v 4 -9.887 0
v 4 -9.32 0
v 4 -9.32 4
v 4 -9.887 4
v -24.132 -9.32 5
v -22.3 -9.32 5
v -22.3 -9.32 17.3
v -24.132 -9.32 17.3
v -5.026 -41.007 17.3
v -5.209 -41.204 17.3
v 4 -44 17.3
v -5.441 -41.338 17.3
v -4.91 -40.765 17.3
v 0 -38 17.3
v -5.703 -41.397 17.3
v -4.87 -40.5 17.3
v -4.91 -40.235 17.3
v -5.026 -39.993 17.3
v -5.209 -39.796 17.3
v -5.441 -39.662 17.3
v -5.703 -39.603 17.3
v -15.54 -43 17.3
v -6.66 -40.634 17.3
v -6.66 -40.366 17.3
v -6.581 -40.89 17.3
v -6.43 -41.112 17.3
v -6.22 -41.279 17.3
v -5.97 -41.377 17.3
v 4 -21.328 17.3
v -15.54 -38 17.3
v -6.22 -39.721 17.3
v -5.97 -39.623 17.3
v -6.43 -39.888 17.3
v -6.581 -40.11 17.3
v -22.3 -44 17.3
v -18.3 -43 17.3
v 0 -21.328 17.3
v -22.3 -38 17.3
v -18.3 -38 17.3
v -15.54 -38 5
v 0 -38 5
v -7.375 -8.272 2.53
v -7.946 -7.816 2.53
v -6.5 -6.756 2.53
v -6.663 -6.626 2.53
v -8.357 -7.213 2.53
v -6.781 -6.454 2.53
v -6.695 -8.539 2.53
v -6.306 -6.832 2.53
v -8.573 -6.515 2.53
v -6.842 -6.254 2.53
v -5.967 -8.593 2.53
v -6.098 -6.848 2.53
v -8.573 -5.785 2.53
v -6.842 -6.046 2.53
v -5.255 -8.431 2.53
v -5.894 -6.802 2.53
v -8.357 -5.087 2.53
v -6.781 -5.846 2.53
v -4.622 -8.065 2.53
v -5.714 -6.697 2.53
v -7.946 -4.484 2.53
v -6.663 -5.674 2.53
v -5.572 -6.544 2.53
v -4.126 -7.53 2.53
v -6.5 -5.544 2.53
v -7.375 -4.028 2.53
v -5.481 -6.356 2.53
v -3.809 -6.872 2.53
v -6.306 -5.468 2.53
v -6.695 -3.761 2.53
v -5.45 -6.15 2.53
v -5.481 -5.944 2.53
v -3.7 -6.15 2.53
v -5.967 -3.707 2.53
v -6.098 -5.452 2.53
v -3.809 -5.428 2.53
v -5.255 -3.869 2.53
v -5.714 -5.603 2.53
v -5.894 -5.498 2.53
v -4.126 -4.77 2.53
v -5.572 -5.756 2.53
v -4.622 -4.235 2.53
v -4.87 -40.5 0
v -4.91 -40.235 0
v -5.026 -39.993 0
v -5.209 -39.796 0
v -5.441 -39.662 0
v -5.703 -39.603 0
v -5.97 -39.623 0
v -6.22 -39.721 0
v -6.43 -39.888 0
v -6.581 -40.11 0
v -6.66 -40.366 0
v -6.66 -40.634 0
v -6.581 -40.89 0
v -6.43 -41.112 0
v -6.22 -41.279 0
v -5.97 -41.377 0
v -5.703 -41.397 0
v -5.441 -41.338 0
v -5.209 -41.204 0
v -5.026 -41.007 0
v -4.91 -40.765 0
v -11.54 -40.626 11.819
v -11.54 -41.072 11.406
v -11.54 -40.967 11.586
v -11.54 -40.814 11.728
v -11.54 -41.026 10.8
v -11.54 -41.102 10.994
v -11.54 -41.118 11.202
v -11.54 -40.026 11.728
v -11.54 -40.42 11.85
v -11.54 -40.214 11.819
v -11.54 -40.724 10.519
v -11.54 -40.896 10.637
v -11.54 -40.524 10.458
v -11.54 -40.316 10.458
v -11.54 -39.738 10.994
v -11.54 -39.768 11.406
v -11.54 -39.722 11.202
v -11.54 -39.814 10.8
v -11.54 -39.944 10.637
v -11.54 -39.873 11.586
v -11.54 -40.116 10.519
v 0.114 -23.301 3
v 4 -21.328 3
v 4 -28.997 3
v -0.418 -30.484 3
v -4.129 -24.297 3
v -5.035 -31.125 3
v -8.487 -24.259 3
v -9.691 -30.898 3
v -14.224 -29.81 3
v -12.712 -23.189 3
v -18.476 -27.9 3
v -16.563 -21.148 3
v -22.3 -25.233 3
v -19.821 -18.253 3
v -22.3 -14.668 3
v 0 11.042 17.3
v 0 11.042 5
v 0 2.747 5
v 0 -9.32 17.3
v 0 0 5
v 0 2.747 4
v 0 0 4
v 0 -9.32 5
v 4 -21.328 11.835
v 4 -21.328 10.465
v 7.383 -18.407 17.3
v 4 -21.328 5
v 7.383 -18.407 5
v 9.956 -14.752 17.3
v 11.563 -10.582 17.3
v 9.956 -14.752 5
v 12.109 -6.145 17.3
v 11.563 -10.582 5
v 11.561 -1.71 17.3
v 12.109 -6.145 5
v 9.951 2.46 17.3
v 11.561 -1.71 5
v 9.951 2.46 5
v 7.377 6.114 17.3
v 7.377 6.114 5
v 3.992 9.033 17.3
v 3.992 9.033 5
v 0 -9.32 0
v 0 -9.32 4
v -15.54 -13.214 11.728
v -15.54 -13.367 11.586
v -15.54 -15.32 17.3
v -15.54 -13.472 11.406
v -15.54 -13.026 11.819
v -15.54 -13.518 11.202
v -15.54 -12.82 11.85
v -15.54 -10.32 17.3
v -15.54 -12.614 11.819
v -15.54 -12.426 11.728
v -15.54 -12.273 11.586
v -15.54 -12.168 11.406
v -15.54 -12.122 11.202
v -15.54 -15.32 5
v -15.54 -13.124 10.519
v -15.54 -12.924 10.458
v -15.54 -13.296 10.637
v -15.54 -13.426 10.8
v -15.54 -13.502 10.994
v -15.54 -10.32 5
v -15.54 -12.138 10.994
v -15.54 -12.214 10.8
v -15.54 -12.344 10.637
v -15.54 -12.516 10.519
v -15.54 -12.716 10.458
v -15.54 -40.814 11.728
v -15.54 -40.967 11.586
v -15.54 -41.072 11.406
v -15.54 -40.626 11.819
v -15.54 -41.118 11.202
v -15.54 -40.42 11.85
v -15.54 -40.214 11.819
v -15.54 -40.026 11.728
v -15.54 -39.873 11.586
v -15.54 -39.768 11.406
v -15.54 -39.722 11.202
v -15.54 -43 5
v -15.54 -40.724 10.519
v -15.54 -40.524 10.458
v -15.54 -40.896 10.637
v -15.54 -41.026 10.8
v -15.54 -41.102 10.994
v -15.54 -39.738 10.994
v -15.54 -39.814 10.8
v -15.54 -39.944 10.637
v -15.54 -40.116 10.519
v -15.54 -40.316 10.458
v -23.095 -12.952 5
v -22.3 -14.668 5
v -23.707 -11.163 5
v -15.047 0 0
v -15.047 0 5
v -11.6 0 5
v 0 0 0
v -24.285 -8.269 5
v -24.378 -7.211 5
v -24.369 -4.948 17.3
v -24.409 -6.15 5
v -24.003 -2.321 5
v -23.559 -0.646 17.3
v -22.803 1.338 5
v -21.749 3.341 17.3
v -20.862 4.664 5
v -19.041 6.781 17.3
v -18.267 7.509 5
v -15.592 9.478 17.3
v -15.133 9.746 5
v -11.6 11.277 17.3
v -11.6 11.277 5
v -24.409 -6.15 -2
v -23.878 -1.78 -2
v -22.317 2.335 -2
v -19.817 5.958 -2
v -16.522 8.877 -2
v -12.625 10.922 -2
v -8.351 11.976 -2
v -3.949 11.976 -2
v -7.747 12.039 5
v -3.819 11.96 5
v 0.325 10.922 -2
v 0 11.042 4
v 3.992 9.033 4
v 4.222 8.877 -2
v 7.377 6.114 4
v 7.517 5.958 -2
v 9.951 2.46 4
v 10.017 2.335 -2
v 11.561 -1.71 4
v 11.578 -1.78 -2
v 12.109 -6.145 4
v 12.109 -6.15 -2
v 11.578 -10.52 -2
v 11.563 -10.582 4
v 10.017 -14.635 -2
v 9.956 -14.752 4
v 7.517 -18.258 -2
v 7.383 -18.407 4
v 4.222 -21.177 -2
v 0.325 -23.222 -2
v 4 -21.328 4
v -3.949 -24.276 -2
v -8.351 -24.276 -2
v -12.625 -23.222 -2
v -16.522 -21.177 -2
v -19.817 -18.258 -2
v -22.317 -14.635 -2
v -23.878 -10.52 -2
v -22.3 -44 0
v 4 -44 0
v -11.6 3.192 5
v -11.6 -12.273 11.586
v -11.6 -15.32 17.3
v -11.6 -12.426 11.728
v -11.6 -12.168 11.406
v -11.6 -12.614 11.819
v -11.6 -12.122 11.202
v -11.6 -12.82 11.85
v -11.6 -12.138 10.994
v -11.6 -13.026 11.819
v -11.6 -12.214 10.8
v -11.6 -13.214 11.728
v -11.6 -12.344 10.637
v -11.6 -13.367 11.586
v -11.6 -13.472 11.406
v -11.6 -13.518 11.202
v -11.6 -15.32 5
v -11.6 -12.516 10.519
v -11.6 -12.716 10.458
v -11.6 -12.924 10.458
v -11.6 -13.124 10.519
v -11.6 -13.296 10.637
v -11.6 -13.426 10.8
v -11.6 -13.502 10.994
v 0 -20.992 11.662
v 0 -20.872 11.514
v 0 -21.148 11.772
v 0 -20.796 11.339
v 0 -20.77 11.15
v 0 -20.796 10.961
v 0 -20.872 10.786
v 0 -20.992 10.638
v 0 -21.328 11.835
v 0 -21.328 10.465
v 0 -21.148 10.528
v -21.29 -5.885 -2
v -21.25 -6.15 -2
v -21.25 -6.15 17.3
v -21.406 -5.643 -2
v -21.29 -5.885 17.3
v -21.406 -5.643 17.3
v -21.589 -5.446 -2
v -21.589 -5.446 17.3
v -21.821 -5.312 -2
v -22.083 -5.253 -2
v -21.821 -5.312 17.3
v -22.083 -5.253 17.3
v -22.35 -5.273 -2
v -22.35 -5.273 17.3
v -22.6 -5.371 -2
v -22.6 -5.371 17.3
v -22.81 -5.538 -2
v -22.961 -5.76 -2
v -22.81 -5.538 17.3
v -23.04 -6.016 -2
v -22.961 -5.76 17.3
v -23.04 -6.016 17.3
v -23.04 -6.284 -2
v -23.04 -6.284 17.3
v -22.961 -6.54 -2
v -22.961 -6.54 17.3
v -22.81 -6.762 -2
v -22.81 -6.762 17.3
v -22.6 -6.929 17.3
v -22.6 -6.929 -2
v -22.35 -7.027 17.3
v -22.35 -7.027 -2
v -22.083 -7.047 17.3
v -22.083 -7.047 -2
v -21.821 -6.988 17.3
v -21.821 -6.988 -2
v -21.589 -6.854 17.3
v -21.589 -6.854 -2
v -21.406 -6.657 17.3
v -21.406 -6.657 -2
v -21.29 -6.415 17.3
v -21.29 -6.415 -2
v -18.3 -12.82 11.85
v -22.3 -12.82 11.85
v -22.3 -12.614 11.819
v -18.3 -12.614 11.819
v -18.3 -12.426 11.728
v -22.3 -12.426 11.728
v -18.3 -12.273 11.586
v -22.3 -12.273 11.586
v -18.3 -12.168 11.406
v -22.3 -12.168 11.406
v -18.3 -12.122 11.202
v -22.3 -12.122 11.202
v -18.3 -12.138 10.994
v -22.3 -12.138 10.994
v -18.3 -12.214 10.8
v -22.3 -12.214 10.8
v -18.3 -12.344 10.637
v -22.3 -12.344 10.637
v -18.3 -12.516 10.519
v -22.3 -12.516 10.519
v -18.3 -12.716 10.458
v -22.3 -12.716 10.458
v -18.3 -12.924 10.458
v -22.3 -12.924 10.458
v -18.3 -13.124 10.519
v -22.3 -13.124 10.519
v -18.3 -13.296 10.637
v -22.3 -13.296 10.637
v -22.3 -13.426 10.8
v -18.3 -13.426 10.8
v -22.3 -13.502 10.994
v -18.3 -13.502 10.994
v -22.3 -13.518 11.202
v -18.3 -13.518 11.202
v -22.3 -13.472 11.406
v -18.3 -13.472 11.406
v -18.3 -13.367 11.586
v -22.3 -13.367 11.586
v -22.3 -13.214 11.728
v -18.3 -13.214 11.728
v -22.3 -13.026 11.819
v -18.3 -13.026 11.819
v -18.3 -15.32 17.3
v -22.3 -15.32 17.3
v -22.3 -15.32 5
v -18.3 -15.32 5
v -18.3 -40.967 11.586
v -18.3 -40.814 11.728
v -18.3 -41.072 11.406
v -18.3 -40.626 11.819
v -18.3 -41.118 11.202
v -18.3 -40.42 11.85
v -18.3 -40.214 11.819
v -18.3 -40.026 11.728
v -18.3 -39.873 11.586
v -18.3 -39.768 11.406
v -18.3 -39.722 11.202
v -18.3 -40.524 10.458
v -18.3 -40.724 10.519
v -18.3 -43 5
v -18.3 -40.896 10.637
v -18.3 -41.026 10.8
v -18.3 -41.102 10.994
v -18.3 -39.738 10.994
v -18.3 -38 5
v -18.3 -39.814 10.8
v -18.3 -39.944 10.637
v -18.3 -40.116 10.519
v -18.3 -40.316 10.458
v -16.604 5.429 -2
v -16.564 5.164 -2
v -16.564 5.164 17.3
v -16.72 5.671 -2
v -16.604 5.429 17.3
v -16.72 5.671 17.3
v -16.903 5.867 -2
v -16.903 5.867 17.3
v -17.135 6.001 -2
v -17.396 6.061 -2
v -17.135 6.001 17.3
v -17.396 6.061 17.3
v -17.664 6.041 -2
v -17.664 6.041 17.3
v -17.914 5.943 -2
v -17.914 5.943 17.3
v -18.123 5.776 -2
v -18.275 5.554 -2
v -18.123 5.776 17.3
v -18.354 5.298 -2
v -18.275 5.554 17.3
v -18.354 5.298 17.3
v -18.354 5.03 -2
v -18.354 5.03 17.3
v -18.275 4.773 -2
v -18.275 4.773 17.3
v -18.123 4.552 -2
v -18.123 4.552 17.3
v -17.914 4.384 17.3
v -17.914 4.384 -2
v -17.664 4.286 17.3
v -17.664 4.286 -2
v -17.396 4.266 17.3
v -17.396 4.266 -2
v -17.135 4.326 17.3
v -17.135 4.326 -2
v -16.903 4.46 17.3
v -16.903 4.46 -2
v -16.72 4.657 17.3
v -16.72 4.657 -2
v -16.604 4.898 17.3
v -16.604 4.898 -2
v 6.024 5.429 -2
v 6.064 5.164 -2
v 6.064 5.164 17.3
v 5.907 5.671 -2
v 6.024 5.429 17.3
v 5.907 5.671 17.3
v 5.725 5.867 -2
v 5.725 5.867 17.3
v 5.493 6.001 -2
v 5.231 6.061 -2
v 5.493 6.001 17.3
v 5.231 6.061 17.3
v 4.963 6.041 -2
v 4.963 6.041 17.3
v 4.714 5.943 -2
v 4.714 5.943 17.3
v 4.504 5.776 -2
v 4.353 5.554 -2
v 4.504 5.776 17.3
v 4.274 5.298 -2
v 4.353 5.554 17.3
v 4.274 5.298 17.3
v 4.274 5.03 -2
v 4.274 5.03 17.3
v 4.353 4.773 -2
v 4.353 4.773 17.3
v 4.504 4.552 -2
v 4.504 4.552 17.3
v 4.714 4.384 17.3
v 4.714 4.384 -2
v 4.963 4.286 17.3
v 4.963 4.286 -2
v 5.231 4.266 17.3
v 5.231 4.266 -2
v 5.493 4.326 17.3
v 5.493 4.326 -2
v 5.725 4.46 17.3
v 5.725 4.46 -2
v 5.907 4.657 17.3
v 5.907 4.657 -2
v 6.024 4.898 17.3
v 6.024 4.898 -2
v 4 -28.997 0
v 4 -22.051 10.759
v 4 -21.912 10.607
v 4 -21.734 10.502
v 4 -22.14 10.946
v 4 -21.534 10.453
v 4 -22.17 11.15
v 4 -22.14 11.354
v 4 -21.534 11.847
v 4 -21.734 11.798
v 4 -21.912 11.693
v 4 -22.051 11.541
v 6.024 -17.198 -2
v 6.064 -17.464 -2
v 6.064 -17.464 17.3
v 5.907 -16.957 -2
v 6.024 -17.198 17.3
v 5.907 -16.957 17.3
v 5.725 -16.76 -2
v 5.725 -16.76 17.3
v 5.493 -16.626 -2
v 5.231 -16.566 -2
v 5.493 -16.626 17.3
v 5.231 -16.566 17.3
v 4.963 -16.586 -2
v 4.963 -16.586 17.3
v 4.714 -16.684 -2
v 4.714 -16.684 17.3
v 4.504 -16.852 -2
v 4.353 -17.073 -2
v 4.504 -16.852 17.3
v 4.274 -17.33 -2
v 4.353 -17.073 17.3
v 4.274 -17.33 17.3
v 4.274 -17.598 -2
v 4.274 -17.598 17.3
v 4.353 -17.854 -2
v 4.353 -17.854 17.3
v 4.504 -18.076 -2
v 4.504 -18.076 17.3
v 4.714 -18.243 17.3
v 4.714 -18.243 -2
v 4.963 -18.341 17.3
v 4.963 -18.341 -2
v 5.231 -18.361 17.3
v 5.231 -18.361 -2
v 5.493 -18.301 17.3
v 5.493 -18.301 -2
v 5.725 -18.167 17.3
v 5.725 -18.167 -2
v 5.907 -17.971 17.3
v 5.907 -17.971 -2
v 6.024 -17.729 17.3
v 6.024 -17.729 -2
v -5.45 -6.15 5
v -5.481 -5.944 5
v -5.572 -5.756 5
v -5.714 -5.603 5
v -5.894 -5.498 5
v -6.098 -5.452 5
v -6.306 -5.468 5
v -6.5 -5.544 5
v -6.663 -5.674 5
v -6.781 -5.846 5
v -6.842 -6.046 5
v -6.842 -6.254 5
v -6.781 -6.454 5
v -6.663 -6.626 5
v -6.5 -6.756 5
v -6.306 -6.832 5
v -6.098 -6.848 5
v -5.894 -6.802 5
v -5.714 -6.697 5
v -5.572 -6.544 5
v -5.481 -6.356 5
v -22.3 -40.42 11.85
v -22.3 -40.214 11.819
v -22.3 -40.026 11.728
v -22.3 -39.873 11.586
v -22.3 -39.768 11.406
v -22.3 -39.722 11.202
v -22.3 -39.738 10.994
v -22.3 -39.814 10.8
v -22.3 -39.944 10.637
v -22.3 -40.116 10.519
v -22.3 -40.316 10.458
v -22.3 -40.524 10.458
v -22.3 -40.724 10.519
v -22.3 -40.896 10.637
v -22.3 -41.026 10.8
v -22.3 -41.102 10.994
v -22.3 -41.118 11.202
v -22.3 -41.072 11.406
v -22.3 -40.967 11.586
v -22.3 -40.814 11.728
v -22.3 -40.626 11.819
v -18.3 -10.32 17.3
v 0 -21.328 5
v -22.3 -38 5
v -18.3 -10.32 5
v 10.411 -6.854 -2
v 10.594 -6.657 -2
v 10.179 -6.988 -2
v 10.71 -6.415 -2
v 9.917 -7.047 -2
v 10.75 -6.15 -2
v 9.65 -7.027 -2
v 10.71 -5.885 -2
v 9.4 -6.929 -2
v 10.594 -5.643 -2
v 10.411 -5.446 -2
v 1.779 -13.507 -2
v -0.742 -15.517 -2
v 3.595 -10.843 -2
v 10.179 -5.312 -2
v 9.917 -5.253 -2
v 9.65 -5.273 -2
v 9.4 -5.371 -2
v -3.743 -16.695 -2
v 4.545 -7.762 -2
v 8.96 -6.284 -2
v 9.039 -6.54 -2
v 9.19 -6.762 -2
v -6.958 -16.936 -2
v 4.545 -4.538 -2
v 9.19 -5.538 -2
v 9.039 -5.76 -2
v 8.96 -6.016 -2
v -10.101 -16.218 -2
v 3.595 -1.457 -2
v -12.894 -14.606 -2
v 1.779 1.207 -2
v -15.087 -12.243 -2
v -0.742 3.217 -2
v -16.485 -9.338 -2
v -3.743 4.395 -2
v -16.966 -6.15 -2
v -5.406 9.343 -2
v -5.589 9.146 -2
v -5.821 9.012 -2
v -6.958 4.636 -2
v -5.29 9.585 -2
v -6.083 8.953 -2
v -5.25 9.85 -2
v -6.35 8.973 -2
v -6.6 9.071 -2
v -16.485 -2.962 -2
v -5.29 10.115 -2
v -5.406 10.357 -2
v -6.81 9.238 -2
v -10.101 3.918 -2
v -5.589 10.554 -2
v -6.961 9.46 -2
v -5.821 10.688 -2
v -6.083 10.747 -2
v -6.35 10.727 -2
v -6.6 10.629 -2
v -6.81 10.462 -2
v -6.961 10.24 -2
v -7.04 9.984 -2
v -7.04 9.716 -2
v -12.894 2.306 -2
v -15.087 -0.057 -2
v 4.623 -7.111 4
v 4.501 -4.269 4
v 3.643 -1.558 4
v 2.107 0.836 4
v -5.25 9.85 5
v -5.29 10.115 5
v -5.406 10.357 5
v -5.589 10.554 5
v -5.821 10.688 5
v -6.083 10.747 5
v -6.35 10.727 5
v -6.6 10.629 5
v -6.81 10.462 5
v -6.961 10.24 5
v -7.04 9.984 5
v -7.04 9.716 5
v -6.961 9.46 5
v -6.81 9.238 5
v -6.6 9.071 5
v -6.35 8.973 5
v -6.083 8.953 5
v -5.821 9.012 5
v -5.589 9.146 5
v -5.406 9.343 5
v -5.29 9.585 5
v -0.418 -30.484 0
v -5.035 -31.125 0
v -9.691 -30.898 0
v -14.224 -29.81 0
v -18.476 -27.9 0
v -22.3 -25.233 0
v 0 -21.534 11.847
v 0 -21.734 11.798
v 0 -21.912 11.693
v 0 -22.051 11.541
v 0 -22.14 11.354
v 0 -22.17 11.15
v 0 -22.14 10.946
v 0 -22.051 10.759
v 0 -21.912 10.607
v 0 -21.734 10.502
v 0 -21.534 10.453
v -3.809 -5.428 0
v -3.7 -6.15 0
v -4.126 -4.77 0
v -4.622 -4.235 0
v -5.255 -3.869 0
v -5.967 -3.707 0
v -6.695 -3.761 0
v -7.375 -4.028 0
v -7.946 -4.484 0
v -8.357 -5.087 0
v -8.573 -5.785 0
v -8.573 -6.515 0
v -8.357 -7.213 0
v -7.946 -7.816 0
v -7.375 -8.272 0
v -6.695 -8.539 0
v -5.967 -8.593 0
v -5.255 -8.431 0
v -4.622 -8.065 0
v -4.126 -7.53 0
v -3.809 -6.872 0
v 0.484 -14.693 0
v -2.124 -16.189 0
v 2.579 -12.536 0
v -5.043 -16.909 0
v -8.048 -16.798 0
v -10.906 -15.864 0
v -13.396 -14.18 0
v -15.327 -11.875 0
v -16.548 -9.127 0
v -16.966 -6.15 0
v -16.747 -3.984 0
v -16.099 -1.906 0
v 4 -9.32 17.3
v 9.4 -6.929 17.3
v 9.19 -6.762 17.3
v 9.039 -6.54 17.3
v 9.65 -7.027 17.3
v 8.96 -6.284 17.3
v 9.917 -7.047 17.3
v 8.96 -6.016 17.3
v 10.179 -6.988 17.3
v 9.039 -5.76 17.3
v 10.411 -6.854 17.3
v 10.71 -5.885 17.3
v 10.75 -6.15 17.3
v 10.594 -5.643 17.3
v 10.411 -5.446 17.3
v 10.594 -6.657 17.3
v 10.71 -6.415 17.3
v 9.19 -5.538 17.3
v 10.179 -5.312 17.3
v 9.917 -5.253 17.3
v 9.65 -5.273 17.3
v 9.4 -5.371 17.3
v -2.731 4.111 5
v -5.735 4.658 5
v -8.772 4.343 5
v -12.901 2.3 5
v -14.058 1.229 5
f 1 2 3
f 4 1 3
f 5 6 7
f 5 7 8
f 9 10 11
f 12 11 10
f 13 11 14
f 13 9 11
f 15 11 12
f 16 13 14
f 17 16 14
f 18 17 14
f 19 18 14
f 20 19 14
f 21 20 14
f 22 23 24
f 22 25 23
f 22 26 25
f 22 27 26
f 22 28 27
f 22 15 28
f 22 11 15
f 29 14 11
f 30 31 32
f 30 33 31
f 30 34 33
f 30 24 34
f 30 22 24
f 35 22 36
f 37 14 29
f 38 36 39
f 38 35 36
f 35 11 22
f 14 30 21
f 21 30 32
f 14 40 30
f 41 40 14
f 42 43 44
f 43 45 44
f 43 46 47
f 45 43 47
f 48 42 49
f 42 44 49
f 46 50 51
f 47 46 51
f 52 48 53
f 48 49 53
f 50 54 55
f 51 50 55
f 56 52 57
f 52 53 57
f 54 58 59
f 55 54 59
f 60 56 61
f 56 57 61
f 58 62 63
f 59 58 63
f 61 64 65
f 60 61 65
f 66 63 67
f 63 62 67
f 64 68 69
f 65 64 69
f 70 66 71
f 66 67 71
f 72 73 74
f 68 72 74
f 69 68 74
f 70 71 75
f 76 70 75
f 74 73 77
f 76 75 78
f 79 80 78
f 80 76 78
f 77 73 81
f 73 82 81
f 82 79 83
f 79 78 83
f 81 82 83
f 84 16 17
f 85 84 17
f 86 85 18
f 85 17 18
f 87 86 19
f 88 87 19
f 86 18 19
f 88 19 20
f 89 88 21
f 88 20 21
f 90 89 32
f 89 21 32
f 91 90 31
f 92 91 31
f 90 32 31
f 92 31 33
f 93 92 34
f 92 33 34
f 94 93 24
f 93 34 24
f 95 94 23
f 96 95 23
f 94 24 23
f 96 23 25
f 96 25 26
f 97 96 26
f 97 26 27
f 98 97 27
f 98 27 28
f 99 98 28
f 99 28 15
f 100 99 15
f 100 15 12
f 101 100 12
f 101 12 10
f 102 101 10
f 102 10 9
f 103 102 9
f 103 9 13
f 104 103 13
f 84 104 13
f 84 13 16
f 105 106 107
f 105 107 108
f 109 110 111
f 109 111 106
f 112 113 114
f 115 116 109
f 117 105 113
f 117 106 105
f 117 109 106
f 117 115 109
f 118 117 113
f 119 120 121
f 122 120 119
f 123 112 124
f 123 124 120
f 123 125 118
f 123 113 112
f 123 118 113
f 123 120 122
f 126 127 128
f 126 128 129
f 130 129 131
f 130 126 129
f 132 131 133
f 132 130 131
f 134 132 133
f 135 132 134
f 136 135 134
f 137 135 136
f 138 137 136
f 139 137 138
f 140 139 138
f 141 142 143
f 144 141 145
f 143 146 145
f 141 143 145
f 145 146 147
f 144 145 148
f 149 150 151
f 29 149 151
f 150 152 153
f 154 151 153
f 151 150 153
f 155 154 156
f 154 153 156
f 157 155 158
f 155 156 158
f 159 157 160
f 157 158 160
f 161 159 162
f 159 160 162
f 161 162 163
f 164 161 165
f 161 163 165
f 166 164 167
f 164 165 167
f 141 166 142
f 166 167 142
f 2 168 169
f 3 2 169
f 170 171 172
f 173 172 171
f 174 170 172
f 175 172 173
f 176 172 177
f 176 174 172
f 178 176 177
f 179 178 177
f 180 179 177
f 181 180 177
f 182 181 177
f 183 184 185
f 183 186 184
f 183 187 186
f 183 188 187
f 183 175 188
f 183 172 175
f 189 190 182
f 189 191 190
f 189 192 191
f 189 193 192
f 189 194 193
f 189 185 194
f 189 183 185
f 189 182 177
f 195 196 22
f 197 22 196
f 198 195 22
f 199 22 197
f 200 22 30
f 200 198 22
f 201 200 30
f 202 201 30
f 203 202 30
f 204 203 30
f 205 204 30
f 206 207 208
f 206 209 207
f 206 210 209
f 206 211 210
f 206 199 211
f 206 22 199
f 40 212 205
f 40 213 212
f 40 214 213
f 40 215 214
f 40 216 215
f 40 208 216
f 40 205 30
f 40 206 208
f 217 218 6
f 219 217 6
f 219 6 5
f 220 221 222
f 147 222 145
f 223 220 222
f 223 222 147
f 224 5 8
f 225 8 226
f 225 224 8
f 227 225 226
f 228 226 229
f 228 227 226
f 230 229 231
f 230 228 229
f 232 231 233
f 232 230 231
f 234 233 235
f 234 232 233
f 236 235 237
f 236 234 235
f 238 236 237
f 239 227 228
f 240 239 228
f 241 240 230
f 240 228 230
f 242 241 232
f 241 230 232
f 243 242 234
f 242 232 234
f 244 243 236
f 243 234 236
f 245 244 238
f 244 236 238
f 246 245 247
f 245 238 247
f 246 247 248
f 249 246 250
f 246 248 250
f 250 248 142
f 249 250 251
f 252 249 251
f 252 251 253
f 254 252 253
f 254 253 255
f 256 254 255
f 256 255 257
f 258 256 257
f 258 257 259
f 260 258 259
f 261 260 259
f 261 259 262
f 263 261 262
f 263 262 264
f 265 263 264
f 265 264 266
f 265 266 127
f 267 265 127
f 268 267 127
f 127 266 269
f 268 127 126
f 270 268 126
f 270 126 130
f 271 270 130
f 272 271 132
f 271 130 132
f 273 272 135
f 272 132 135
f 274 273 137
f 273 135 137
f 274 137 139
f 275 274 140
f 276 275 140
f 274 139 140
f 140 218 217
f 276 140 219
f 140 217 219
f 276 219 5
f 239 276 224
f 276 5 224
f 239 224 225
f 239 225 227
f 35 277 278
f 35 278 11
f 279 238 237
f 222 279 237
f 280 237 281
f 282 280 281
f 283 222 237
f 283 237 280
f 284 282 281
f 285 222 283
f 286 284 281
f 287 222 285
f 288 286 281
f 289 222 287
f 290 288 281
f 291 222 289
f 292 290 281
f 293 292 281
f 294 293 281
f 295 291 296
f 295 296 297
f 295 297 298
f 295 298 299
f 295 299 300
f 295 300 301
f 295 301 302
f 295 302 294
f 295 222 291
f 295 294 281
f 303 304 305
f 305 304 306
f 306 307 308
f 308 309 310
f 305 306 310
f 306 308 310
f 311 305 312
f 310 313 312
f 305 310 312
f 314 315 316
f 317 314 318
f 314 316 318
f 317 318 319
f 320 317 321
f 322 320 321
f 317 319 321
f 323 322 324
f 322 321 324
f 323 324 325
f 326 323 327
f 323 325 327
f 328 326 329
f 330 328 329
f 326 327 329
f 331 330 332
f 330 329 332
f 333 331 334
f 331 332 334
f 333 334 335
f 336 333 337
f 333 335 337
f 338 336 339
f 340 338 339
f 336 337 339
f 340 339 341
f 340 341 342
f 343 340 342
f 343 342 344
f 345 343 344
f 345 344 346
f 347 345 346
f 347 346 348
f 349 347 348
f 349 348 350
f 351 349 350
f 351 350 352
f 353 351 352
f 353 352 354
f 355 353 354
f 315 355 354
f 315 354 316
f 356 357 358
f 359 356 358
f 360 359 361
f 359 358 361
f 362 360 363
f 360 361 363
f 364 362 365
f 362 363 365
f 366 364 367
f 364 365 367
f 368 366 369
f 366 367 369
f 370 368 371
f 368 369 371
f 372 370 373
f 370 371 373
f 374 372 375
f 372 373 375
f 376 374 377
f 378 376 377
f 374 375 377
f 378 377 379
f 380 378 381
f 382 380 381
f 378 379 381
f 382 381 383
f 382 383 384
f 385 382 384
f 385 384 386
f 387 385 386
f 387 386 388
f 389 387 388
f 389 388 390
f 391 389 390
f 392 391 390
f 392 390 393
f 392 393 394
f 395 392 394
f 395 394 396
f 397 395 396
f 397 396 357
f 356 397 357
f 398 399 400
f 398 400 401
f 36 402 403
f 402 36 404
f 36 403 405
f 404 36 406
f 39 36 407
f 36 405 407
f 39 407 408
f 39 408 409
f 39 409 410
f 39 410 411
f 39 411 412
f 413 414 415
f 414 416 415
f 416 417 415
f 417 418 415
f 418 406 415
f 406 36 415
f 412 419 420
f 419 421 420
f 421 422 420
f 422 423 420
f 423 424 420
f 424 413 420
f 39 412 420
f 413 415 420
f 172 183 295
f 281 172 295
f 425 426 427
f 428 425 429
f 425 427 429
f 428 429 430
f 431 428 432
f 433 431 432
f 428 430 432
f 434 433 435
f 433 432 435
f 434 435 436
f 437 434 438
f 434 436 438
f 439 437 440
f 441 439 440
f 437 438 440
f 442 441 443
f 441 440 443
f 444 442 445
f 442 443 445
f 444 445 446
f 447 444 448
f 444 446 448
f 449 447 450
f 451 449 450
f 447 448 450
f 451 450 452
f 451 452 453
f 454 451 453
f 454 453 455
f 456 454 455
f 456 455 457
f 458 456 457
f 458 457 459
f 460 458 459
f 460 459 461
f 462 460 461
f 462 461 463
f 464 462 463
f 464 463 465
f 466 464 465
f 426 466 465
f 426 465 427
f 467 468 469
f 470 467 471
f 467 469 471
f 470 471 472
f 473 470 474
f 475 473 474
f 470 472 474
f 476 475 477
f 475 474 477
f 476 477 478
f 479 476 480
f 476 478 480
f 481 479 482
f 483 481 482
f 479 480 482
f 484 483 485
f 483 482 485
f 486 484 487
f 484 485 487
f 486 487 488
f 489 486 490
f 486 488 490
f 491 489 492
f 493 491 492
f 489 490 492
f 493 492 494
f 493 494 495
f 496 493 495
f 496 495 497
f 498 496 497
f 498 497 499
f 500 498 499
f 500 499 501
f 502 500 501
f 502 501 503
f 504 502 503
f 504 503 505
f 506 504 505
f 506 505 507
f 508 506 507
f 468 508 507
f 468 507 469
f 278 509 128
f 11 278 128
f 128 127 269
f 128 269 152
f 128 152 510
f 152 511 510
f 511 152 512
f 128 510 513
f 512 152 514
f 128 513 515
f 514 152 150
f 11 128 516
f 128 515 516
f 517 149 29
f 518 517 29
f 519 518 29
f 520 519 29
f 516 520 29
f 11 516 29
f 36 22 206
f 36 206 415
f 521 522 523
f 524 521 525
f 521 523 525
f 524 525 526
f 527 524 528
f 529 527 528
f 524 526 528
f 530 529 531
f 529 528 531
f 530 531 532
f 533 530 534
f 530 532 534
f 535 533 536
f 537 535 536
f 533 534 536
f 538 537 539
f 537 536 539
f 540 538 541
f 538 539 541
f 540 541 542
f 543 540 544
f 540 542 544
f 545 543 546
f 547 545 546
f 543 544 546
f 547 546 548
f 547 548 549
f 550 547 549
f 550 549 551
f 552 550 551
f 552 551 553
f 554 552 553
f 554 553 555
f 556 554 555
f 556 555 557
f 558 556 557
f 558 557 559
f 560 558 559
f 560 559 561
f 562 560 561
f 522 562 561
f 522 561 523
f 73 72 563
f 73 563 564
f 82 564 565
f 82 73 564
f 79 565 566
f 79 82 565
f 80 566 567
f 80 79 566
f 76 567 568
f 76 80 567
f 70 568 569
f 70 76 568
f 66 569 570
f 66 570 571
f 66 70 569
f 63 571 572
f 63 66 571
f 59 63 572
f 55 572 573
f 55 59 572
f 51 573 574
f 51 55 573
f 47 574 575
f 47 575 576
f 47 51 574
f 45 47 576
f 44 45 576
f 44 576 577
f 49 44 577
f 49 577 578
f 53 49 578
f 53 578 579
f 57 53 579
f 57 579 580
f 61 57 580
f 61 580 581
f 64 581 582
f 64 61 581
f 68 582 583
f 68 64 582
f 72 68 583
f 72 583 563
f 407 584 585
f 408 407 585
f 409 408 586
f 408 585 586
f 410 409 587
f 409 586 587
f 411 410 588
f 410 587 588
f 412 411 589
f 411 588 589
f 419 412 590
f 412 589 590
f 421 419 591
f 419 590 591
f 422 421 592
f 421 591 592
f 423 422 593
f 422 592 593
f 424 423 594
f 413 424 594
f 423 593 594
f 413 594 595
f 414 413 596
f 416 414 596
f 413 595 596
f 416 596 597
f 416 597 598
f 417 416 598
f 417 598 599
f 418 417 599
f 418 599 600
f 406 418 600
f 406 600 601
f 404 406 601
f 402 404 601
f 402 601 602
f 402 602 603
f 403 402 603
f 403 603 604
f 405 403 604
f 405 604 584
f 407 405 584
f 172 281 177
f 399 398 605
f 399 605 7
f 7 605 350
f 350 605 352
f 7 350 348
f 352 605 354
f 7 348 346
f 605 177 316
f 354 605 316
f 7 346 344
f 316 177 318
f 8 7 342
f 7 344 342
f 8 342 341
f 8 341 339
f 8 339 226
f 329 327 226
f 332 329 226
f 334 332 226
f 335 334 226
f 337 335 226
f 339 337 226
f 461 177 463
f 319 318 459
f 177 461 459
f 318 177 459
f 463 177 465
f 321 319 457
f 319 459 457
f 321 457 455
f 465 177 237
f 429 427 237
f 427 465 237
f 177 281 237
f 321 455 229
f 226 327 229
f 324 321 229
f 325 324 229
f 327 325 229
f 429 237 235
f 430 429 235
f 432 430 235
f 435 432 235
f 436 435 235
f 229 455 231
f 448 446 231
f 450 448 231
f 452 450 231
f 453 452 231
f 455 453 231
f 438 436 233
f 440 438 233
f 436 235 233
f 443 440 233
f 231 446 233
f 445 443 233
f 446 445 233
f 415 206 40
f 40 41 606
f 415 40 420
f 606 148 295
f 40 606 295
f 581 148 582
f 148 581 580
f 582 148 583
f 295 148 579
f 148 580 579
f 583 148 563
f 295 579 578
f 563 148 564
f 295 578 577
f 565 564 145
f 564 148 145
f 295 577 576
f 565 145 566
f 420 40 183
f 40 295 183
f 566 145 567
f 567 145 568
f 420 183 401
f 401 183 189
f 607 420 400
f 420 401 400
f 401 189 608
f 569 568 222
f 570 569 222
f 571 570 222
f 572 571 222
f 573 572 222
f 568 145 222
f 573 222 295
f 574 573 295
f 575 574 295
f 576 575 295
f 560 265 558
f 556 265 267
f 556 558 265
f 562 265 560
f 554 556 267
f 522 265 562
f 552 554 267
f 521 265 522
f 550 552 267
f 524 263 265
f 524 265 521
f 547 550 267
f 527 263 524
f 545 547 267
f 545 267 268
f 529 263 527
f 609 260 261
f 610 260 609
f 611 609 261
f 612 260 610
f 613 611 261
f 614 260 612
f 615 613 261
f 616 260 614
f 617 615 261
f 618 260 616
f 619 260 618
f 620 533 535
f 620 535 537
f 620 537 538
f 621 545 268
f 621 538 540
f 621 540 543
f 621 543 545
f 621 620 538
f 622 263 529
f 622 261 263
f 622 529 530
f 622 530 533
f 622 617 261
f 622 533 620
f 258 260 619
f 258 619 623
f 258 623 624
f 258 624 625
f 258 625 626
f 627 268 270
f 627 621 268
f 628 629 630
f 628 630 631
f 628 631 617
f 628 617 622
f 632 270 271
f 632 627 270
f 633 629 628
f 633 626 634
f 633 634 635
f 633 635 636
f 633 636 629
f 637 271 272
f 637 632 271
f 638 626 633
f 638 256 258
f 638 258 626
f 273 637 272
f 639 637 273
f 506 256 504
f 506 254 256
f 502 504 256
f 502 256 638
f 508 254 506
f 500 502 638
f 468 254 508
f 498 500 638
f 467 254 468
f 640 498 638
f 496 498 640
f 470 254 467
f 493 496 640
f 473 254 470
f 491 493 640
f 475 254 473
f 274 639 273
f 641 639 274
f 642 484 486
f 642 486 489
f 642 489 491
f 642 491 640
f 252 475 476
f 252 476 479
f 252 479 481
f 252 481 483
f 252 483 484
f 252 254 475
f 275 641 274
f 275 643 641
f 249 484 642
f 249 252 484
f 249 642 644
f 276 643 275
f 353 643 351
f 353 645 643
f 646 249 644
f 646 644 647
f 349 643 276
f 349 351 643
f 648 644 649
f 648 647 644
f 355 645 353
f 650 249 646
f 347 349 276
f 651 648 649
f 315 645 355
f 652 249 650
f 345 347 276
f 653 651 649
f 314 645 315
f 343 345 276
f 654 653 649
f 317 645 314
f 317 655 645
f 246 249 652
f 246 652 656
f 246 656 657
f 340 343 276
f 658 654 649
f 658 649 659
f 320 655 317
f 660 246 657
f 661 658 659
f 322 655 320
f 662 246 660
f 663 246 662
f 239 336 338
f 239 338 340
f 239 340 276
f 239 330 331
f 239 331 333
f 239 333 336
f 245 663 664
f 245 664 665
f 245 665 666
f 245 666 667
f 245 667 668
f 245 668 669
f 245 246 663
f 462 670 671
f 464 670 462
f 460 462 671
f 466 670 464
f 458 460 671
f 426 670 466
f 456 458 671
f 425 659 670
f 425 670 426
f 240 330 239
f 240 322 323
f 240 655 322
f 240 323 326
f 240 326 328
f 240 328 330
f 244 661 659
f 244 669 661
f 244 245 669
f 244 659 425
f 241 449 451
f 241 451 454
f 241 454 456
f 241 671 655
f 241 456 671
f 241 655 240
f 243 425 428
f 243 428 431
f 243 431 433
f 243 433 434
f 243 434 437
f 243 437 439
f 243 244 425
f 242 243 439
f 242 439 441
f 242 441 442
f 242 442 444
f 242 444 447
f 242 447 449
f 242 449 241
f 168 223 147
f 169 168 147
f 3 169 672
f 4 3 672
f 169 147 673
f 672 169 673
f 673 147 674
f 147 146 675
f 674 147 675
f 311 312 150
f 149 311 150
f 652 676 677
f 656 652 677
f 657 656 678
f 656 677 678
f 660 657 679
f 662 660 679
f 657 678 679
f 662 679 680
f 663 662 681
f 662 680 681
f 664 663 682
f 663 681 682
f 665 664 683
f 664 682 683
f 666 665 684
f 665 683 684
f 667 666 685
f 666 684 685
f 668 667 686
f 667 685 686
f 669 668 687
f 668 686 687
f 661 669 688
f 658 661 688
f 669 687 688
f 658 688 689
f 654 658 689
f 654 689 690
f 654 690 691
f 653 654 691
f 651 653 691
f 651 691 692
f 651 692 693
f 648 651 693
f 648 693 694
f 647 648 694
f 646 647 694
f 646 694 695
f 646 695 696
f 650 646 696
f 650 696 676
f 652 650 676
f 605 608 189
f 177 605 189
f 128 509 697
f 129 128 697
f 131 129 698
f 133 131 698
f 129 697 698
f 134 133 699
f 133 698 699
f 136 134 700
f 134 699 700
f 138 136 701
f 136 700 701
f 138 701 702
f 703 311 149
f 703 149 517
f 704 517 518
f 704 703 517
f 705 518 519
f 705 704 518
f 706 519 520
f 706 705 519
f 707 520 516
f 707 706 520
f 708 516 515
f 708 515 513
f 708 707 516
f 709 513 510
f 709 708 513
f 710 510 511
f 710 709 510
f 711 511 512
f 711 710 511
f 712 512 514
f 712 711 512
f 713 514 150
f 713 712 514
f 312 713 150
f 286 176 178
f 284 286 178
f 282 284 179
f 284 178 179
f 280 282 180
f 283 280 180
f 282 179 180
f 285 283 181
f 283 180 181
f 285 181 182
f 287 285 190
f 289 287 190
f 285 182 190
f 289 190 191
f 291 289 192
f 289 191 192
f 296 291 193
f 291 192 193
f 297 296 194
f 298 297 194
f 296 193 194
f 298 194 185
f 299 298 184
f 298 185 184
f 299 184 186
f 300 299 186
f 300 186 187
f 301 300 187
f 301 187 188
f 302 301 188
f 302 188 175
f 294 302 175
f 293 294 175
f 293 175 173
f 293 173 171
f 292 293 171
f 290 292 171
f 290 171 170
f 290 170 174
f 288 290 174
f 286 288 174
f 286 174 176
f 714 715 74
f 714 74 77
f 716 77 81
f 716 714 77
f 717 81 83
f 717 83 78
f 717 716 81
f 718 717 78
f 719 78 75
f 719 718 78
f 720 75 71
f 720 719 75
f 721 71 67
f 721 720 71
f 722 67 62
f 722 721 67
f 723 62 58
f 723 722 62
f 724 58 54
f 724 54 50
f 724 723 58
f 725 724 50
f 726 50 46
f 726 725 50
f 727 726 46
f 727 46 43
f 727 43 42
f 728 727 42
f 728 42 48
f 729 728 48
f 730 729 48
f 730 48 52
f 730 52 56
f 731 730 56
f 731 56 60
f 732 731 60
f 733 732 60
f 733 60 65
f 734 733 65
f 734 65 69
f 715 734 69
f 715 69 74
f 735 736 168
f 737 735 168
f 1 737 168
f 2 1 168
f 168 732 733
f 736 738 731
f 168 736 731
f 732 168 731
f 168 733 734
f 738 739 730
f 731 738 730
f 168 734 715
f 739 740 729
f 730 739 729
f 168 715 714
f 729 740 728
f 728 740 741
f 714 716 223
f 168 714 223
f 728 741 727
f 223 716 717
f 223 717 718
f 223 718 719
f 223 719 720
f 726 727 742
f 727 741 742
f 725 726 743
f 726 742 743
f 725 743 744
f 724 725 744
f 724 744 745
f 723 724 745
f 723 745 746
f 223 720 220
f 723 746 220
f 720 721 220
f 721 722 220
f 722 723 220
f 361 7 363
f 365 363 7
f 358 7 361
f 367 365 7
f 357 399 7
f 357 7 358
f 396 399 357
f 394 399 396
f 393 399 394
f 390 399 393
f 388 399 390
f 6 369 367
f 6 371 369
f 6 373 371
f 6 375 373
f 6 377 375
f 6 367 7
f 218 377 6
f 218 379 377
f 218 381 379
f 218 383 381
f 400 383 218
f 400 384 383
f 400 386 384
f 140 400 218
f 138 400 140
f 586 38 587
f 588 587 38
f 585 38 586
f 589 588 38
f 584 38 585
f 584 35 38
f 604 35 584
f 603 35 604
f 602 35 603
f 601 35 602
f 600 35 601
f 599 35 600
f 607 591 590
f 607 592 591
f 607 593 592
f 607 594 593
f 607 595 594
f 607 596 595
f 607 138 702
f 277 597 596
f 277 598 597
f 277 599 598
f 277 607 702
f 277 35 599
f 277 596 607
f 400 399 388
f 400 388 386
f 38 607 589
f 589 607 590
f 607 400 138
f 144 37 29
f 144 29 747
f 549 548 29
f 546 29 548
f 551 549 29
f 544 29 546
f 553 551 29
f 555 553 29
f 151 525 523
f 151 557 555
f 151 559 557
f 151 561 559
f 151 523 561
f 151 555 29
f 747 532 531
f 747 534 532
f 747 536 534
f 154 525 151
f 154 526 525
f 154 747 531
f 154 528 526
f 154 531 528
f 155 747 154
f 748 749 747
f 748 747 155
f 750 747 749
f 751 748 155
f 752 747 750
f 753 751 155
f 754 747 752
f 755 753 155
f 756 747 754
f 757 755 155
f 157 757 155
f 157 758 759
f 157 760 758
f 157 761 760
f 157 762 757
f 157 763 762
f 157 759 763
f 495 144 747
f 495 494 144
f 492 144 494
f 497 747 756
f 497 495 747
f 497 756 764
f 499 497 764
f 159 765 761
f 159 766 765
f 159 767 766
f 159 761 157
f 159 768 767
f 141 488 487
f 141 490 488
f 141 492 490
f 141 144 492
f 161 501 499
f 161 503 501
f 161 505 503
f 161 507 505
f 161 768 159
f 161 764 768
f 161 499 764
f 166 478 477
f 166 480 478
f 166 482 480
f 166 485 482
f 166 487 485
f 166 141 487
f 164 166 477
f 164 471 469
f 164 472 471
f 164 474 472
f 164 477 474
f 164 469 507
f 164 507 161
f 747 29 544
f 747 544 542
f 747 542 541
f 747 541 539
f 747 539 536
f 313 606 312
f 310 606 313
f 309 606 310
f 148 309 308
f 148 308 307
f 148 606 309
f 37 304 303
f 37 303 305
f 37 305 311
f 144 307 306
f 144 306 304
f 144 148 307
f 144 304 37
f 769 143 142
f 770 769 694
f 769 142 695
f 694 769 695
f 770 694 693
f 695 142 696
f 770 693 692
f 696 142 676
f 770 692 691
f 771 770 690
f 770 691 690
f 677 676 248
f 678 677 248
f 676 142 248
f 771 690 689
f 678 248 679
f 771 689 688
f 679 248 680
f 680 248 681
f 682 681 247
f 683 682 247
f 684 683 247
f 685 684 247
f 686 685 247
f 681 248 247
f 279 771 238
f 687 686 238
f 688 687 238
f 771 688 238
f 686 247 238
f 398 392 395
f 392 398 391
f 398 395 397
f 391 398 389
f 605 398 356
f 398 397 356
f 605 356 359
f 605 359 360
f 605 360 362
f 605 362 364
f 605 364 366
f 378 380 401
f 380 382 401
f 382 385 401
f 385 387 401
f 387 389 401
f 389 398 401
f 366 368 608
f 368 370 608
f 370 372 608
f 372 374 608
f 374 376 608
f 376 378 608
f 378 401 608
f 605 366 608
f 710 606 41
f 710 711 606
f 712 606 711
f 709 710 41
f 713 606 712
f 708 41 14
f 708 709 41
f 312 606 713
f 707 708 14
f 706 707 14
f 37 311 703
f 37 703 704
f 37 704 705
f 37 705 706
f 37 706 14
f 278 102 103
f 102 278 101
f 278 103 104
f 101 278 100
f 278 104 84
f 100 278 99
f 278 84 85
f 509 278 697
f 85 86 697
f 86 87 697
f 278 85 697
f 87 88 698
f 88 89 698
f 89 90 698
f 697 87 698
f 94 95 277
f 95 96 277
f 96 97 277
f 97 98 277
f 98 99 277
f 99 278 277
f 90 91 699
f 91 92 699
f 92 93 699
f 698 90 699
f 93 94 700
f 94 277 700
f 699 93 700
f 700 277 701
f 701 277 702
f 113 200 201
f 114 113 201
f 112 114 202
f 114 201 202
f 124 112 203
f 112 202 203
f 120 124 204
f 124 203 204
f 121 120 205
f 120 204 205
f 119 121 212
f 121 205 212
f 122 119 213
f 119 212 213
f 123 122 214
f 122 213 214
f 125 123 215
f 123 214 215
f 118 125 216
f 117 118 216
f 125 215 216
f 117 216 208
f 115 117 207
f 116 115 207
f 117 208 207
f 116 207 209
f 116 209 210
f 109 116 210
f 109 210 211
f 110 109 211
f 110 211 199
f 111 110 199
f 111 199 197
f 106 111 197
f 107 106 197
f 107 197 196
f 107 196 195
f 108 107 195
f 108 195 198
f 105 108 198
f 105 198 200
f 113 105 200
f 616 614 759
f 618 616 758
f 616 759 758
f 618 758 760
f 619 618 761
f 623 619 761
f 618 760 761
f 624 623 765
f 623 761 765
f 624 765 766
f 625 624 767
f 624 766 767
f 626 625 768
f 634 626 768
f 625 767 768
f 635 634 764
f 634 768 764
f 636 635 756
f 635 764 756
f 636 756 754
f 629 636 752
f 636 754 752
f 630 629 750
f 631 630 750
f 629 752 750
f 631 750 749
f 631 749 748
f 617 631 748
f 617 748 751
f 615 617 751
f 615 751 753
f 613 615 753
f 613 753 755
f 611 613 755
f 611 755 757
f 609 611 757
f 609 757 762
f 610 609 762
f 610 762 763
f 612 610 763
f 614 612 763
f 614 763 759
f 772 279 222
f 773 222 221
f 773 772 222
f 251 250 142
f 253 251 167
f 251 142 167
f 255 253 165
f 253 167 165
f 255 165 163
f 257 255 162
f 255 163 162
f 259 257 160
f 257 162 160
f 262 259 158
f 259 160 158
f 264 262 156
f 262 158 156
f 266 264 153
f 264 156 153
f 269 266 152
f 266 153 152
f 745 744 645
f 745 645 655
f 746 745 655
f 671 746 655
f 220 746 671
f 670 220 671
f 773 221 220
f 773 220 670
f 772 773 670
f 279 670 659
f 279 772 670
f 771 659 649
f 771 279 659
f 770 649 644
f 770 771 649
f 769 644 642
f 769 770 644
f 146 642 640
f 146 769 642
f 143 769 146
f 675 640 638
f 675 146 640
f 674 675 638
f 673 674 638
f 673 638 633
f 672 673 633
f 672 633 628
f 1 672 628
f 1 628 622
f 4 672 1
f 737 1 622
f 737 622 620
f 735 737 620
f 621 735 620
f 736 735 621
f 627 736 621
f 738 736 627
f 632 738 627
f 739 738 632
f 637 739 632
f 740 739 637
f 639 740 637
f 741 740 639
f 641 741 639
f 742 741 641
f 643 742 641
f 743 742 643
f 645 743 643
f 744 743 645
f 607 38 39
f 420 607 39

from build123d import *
from build123d.topology import SkipClean

# Parameters (mm, degrees)
ESQUISSE1_W              = 22.3
ESQUISSE1_H              = 43
ESQUISSE1_R              = 2.45
BOSS_EXTRU_1_DEPTH       = 5
BOSS_EXTRU_2_START       = -2.47
ESQUISSE2_R              = 2.45
ESQUISSE2_R_2            = 0.7
BOSS_EXTRU_2_DEPTH       = 2.47
ESQUISSE3_W              = 4
ESQUISSE3_H              = 5
ESQUISSE3_W_2            = 3.94
BOSS_EXTRU_3_DEPTH       = 12.3
ESQUISSE4_R              = 0.7
ENL_V_MAT_EXTRU_1_DEPTH  = 52.435201954
BOSS_EXTRU_4_DEPTH       = 1
ESQUISSE6_W              = 10.7
ESQUISSE6_H              = 12.3
BOSS_EXTRU_5_DEPTH       = 1
ESQUISSE7_R              = 0.7
BOSS_EXTRU_6_DEPTH       = 4
BOSS_EXTRU_7_DEPTH       = 2
BOSS_EXTRU_7_DEPTH_BACK  = 5
ESQUISSE10_R             = 18.258884917
ESQUISSE10_R_2           = 10.815915506
ESQUISSE11_R             = 25
ESQUISSE11_R_2           = 18.258884917
ENL_V_MAT_EXTRU_4_DEPTH  = 3
ESQUISSE13_W             = 11.54
ESQUISSE13_H             = 5
BOSS_EXTRU_14_DEPTH      = 12.3
BOSS_EXTRU_15_DEPTH      = 12.3
BOSS_EXTRU_19_DEPTH      = 12.3
BOSS_EXTRU_19_DEPTH_BACK = 1
ESQUISSE16_R             = 0.9
ENL_V_MAT_EXTRU_5_DEPTH  = 54.89147246
ESQUISSE17_R             = 0.9
ENL_V_MAT_EXTRU_6_DEPTH  = 54.891424113


with BuildPart() as part:
    # Esquisse1 → Boss.-Extru.1 (new body)
    with BuildSketch(Plane.XY):
        with Locations((-11.15, -21.5)):
            Rectangle(ESQUISSE1_W, ESQUISSE1_H)
        with Locations((-6.15, -6.15)):
            Circle(ESQUISSE1_R, mode=Mode.SUBTRACT)
    extrude(amount=BOSS_EXTRU_1_DEPTH)

    # Esquisse2 → Boss.-Extru.2 (add)
    with BuildSketch(Plane.XY.offset(5).offset(BOSS_EXTRU_2_START)):
        with Locations((-6.15, -6.15)):
            Circle(ESQUISSE2_R)
        with Locations((-6.15, -6.15)):
            Circle(ESQUISSE2_R_2, mode=Mode.SUBTRACT)
    extrude(amount=BOSS_EXTRU_2_DEPTH)

    # Esquisse3 → Boss.-Extru.3 (add)
    with BuildSketch(Plane.XY.offset(5)):
        with Locations((-20.3, -40.5)):
            Rectangle(ESQUISSE3_W, ESQUISSE3_H)
        with Locations((-13.54, -40.5)):
            Rectangle(ESQUISSE3_W, ESQUISSE3_H)
        with Locations((-20.3, -12.82)):
            Rectangle(ESQUISSE3_W, ESQUISSE3_H)
        with Locations((-13.57, -12.82)):
            Rectangle(ESQUISSE3_W_2, ESQUISSE3_H)
    extrude(amount=BOSS_EXTRU_3_DEPTH)

    # Esquisse4 → Enlèv. mat.-Extru.1 (cut, through all)
    with BuildSketch(Plane.ZY.offset(22.3)):
        with Locations((11.15, -12.82)):
            Circle(ESQUISSE4_R)
        with Locations((11.15, -40.42)):
            Circle(ESQUISSE4_R)
    extrude(amount=-ENL_V_MAT_EXTRU_1_DEPTH, mode=Mode.SUBTRACT)

    # Esquisse5 → Boss.-Extru.4 (add)
    with BuildSketch(Plane.XZ.offset(43)):
        Polygon((-22.3, 17.3), (-11.54, 17.3), (0, 17.3), (0, 5), (0, 0), (-22.3, 0), align=None)
    extrude(amount=BOSS_EXTRU_4_DEPTH)

    # Esquisse6 → Boss.-Extru.5 (add)
    with BuildSketch(Plane(origin=(0, -10.32, 0), x_dir=(1, 0, 0), z_dir=(0, 1, 0))):
        with Locations((-16.95, -11.15)):
            Rectangle(ESQUISSE6_W, ESQUISSE6_H)
    extrude(amount=BOSS_EXTRU_5_DEPTH)

    # Esquisse7 → Boss.-Extru.6 (add)
    with BuildSketch(Plane(origin=(0, 0, 0), x_dir=(0, 0, -1), z_dir=(1, 0, 0))):
        Polygon((-5, -9.32), (0, -9.32), (0, -15.32), (0, -27.62), (0, -44), (-17.3, -44), (-17.3, -9.32), align=None)
        with Locations(Location((-11.15, -21.47, 0), (0, 0, 90))):
            Circle(ESQUISSE7_R, mode=Mode.SUBTRACT)
    extrude(amount=BOSS_EXTRU_6_DEPTH)

    # Esquisse10 → Boss.-Extru.7 (add, two sides: drawn at the far end of the back side and taken through both)
    with BuildSketch(Plane(origin=(0, 0, 0), x_dir=(-1, 0, 0), z_dir=(0, 0, -1)).offset(-BOSS_EXTRU_7_DEPTH_BACK)):
        with Locations((6.15, -6.15)):
            Circle(ESQUISSE10_R)
        with Locations((6.15, -6.15)):
            Circle(ESQUISSE10_R_2, mode=Mode.SUBTRACT)
    extrude(amount=BOSS_EXTRU_7_DEPTH + BOSS_EXTRU_7_DEPTH_BACK)

    # Esquisse11 → Enlèv. mat.-Extru.4 (cut)
    with BuildSketch(Plane(origin=(0, 0, 0), x_dir=(-1, 0, 0), z_dir=(0, 0, -1))):
        with Locations((6.15, -6.15)):
            Circle(ESQUISSE11_R)
        with Locations((6.15, -6.15)):
            Circle(ESQUISSE11_R_2, mode=Mode.SUBTRACT)
    extrude(amount=-ENL_V_MAT_EXTRU_4_DEPTH, mode=Mode.SUBTRACT)

    # Esquisse13 → Boss.-Extru.14 (add, through all)
    with BuildSketch(Plane.XY.offset(5)):
        with Locations((-5.77, -40.5)):
            Rectangle(ESQUISSE13_W, ESQUISSE13_H)
    extrude(amount=BOSS_EXTRU_14_DEPTH)

    # Esquisse14 → Boss.-Extru.15 (add, through all)
    with BuildSketch(Plane.XY.offset(5)):
        with BuildLine():
            Line((-11.6, 11.276542354), (-11.6, -9.32))
            Line((-11.6, -9.32), (-24.131601108, -9.32))
            ThreePointArc((-24.131601108, -9.32), (-21.748537491, 3.340653642), (-11.6, 11.276542354))
        make_face()
    extrude(amount=BOSS_EXTRU_15_DEPTH)

    # Esquisse15 → Boss.-Extru.19 (add, two sides: drawn at the far end of the back side and taken through both)
    with SkipClean():  # the faces are left unmerged after this step: merging them gives an invalid solid
        with BuildSketch(Plane.XY.offset(5).offset(-BOSS_EXTRU_19_DEPTH_BACK)):
            with BuildLine():
                Line((0, 11.041985878), (0, -21.327759335))
                Line((0, -21.327759335), (4, -21.327759335))
                ThreePointArc((4, -21.327759335), (11.971054089, -3.910741832), (0, 11.041985878))
            make_face()
        extrude(amount=BOSS_EXTRU_19_DEPTH + BOSS_EXTRU_19_DEPTH_BACK)

    # Esquisse16 → Enlèv. mat.-Extru.5 (cut, through all)
    with SkipClean():  # the faces are left unmerged after this step: merging them gives an invalid solid
        with BuildSketch(Plane.XY.offset(17.300185)):
            with Locations((9.85, -6.15)):
                Circle(ESQUISSE16_R)
            with Locations((5.163708499, -17.463708499)):
                Circle(ESQUISSE16_R)
            with Locations((-22.15, -6.15)):
                Circle(ESQUISSE16_R)
            with Locations((-17.463708499, 5.163708499)):
                Circle(ESQUISSE16_R)
            with Locations((-6.15, 9.85)):
                Circle(ESQUISSE16_R)
            with Locations((5.163708499, 5.163708499)):
                Circle(ESQUISSE16_R)
        extrude(amount=-ENL_V_MAT_EXTRU_5_DEPTH, mode=Mode.SUBTRACT)

    # Esquisse17 → Enlèv. mat.-Extru.6 (cut, through all)
    with SkipClean():  # the faces are left unmerged after this step: merging them gives an invalid solid
        with BuildSketch(Plane.XY.offset(17.30005)):
            with Locations((-5.77, -40.5)):
                Circle(ESQUISSE17_R)
        extrude(amount=-ENL_V_MAT_EXTRU_6_DEPTH, mode=Mode.SUBTRACT)


solid = part.part
